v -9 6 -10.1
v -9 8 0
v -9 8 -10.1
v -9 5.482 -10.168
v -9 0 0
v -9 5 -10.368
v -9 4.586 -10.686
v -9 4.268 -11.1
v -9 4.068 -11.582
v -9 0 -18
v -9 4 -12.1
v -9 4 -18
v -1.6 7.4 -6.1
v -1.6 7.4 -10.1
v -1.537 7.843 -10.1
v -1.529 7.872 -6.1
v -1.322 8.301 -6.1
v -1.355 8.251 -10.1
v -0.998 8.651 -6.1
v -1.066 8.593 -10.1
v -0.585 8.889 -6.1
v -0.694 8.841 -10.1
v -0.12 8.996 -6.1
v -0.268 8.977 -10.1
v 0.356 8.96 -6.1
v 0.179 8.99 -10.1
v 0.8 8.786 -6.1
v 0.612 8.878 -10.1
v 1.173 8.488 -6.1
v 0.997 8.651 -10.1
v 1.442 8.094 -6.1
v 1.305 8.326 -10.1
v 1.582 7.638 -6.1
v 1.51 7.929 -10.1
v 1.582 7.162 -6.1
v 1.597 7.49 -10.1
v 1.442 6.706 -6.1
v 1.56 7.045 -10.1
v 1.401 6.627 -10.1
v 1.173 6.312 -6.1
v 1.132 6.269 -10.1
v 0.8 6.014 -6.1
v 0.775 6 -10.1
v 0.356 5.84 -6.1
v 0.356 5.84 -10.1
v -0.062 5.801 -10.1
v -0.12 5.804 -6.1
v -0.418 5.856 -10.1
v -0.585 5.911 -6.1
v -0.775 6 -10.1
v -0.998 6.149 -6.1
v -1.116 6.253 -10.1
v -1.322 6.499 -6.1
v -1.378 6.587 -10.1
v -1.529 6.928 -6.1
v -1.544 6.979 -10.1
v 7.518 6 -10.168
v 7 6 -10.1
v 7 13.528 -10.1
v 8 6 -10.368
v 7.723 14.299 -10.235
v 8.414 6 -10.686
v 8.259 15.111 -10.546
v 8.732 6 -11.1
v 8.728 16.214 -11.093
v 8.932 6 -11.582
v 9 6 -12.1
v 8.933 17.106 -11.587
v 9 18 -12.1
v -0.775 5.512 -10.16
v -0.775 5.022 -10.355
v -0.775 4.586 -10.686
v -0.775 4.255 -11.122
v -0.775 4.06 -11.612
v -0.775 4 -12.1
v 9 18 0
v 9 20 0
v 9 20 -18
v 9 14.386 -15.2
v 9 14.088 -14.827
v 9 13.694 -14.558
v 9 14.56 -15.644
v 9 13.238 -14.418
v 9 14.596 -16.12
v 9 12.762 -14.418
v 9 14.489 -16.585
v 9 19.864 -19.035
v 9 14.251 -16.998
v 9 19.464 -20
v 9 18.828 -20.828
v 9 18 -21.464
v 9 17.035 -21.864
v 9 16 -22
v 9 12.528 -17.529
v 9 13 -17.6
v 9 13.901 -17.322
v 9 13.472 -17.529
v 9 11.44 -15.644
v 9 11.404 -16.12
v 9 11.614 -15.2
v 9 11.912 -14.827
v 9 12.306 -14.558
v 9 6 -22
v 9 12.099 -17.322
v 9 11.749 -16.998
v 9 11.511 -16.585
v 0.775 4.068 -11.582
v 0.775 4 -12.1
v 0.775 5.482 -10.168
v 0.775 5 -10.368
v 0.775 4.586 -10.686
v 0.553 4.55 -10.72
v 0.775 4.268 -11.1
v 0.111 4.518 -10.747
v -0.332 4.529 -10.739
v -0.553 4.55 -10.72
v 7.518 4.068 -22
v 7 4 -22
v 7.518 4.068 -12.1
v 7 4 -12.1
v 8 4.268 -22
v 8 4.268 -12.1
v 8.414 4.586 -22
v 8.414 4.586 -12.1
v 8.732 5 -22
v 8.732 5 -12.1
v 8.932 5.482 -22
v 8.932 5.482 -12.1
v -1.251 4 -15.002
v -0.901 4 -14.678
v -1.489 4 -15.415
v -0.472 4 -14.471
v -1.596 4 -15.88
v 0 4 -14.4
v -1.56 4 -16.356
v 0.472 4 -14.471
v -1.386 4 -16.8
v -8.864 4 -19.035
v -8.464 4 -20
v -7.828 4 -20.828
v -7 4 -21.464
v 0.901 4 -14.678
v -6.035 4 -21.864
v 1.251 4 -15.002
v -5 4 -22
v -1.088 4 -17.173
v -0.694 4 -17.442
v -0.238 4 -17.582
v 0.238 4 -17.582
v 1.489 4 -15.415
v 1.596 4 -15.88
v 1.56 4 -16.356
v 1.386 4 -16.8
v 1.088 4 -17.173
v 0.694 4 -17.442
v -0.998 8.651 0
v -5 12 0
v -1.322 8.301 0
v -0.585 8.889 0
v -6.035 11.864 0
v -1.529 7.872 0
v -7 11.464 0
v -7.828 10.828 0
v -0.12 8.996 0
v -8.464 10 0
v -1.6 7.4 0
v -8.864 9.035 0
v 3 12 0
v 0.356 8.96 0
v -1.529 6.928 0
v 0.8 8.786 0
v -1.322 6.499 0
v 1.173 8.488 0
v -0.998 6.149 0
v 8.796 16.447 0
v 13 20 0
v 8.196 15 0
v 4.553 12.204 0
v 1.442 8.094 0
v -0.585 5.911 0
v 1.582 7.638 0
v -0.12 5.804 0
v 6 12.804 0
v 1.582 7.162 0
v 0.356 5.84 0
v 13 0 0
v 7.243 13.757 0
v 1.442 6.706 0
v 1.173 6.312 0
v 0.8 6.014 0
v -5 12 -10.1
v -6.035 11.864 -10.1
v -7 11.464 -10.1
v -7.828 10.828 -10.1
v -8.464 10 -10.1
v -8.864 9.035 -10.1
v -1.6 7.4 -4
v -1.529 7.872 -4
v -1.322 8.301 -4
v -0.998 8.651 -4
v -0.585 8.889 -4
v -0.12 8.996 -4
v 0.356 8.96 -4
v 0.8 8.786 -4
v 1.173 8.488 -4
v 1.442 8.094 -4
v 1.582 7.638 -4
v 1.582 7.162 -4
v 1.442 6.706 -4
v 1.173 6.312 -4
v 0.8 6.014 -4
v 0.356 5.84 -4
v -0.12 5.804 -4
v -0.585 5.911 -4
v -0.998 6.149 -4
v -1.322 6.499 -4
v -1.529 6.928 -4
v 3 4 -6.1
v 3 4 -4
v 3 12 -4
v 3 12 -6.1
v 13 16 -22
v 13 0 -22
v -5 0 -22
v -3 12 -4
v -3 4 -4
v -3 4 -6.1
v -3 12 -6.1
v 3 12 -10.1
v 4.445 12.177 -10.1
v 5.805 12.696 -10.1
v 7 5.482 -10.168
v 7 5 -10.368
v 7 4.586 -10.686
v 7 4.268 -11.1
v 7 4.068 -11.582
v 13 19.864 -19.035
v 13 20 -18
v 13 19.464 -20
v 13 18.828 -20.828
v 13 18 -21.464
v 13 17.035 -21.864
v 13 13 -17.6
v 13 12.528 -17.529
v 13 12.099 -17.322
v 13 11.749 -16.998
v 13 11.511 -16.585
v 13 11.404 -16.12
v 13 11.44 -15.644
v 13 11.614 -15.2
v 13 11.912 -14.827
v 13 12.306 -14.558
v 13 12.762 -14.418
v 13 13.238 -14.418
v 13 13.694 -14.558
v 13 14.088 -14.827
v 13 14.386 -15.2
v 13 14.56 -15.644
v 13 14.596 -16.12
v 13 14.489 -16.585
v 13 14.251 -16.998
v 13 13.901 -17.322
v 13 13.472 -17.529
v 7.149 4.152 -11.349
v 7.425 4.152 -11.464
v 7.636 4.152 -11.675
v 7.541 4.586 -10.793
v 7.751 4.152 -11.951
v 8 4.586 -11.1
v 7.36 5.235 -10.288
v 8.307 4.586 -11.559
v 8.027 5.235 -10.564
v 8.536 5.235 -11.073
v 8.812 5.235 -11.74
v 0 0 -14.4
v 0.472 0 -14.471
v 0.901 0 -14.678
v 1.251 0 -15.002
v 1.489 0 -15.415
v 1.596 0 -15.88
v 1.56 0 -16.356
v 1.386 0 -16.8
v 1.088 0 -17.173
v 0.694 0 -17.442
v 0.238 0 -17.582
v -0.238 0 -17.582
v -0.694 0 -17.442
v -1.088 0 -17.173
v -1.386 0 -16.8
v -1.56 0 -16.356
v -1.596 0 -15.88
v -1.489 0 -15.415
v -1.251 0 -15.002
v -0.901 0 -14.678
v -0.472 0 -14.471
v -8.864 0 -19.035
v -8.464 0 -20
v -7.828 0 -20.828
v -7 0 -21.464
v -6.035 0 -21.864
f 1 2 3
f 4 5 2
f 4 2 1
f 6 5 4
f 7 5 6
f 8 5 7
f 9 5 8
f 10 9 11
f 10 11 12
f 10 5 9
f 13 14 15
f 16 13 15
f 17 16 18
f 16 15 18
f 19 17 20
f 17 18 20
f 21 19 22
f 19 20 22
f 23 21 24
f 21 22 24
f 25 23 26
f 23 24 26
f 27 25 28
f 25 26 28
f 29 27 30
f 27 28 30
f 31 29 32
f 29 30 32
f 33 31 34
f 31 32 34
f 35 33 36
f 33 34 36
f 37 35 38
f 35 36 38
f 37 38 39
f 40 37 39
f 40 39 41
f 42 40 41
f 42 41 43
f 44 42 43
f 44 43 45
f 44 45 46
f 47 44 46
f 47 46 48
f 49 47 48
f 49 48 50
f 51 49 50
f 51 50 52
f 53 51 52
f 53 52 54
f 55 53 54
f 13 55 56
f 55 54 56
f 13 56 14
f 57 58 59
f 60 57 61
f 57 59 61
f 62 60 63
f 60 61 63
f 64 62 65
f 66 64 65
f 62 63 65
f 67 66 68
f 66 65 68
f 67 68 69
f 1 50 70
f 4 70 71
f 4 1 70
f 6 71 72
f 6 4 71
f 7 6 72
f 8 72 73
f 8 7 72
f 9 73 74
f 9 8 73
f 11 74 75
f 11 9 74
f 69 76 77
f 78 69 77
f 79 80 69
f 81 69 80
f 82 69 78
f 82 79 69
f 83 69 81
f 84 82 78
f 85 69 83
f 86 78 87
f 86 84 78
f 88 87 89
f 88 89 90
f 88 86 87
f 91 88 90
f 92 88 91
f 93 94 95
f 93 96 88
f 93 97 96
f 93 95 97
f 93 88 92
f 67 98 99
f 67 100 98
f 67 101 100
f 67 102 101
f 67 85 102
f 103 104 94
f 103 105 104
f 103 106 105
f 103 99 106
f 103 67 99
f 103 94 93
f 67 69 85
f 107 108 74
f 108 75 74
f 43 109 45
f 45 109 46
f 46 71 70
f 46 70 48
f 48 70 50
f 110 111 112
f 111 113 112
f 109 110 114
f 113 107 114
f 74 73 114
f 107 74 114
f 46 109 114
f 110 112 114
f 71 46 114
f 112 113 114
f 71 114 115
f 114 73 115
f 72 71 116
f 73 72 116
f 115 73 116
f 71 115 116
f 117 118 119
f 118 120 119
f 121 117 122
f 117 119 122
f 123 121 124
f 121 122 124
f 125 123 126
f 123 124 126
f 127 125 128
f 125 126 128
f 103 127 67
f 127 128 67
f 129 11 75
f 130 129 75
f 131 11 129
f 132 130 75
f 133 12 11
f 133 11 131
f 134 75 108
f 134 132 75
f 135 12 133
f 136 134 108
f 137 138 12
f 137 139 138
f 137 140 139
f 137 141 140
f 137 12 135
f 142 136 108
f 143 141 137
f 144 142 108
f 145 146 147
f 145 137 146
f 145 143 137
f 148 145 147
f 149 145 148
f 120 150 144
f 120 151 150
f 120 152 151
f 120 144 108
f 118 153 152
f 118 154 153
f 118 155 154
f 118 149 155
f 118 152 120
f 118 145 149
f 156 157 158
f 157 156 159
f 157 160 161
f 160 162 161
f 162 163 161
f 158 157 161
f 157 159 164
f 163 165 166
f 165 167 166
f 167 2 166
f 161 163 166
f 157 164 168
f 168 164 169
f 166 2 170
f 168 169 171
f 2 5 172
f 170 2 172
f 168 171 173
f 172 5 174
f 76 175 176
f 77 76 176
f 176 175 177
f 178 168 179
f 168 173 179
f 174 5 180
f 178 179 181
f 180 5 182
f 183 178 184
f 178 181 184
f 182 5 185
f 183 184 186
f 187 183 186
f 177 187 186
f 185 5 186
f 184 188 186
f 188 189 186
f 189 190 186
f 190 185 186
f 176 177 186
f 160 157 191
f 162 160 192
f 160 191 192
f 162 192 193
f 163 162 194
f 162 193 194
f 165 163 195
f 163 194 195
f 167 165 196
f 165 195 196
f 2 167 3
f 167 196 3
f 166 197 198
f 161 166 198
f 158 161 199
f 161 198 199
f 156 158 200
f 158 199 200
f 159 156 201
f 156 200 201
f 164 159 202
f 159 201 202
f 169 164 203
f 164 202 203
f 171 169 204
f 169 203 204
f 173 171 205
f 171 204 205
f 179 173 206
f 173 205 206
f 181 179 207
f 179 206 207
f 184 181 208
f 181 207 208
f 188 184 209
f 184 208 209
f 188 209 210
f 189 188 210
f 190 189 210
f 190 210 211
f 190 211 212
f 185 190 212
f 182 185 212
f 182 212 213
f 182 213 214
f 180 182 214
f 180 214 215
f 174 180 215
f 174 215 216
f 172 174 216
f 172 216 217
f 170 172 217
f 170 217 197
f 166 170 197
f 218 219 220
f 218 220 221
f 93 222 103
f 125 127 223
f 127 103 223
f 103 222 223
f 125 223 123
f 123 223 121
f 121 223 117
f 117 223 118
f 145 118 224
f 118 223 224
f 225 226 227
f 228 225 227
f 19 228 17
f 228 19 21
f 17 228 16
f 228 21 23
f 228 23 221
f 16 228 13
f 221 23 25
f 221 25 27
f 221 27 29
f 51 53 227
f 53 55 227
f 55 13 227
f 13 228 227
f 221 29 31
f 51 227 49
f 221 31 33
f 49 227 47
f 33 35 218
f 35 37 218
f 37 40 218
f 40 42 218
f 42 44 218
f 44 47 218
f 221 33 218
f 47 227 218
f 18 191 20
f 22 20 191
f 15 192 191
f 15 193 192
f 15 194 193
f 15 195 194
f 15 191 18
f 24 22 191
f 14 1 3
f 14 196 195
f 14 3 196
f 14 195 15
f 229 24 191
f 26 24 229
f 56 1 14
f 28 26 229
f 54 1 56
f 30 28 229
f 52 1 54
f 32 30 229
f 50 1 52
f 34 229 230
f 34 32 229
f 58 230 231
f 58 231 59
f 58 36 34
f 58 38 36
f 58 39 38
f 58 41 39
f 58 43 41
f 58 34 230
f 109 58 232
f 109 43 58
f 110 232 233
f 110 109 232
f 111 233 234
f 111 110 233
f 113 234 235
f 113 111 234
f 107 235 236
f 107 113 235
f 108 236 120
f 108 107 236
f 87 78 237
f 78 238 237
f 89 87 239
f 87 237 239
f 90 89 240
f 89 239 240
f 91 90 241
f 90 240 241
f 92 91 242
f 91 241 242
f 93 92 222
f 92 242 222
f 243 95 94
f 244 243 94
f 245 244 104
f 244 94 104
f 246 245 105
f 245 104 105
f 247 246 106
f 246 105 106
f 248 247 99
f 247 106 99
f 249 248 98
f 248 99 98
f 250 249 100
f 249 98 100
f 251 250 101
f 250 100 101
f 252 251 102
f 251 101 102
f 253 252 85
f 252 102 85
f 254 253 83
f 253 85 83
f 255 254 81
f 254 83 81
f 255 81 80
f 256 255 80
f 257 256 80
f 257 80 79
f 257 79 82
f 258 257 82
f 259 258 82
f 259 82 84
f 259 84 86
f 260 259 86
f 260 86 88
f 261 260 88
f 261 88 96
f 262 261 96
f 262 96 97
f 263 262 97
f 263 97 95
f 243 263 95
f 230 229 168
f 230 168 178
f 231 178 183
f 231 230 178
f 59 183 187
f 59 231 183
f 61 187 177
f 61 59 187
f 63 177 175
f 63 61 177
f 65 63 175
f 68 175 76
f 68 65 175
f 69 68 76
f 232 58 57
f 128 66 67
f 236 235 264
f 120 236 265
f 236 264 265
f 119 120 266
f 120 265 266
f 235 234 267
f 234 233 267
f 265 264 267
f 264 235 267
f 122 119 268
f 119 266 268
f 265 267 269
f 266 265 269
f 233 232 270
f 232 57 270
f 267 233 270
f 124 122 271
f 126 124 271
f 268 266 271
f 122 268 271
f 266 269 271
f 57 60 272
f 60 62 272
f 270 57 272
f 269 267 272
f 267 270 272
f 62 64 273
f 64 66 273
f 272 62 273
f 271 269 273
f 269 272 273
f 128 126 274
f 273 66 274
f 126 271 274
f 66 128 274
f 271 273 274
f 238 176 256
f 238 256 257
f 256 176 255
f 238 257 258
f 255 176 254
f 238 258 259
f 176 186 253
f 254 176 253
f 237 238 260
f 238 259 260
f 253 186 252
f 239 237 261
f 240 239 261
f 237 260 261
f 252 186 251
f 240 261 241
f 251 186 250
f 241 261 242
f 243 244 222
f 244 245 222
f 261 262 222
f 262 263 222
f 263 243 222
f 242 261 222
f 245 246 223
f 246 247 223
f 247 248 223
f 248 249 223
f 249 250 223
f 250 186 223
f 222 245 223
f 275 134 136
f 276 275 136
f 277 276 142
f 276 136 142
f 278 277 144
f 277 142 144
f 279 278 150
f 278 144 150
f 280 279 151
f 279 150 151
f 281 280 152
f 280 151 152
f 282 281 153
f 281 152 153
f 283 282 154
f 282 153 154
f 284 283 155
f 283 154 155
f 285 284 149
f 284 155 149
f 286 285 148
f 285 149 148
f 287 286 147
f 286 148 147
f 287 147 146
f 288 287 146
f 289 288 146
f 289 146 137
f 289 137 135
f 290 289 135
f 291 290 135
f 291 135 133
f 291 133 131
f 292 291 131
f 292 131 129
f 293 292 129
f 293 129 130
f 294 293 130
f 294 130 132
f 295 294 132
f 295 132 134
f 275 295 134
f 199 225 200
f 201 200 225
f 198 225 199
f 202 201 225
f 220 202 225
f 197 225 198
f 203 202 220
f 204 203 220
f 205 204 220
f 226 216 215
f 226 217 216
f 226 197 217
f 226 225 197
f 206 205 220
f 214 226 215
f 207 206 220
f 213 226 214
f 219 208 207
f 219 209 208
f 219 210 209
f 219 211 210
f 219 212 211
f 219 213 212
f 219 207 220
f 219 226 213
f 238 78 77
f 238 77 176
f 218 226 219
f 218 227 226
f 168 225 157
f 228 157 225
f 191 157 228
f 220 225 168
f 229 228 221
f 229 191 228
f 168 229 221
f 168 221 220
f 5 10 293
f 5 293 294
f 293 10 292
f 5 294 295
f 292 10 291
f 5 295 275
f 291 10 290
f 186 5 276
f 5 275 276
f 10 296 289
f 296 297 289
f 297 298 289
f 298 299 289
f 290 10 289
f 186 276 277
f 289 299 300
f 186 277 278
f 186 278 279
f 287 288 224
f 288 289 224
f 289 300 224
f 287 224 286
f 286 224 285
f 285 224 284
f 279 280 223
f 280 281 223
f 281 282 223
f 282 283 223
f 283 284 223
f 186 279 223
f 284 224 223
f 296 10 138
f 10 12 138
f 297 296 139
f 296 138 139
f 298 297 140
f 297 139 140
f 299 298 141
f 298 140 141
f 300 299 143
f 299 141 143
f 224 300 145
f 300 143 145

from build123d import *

# Parameters (mm, degrees)
SKETCH2_W                         = 18
SKETCH2_H                         = 22
SKETCH2_W_2                       = 4
BOSS_EXTRUDE1_DEPTH               = 4
SKETCH2_4_W                       = 18
SKETCH2_4_H                       = 10.1
SKETCH2_4_W_2                     = 6
SKETCH2_4_H_2                     = 2.1
BOSS_EXTRUDE2_DEPTH               = 12
SKETCH2_5_W                       = 4
SKETCH2_5_H                       = 22
BOSS_EXTRUDE3_DEPTH               = 20
F_3_2_3_2_MOUNT_HOLES_D           = 3.2
F_3_2_3_2_MOUNT_HOLES_ON_FACE_2_D = 3.2
F_3_2_3_2_MOUNT_HOLES_ON_FACE_3_D = 3.2
FILLET2_R                         = 6
FILLET1_R                         = 2
FILLET3_R                         = 4


with BuildPart() as part:
    # Sketch2 → Boss-Extrude1 (new body)
    with BuildSketch(Plane(origin=(0, 0, 0), x_dir=(1, 0, 0), z_dir=(0, 1, 0))):
        with Locations((0, 11)):
            Rectangle(SKETCH2_W, SKETCH2_H)
        with Locations((11, 11)):
            Rectangle(SKETCH2_W_2, SKETCH2_H)
    extrude(amount=BOSS_EXTRUDE1_DEPTH)

    # Sketch2<4> → Boss-Extrude2 (add)
    with BuildSketch(Plane(origin=(0, 0, 0), x_dir=(1, 0, 0), z_dir=(0, 1, 0))):
        with Locations((0, 5.05)):
            Rectangle(SKETCH2_4_W, SKETCH2_4_H)
        with Locations((0, 5.05)):
            Rectangle(SKETCH2_4_W_2, SKETCH2_4_H_2, mode=Mode.SUBTRACT)
    extrude(amount=BOSS_EXTRUDE2_DEPTH)

    # Sketch2<5> → Boss-Extrude3 (add)
    with BuildSketch(Plane(origin=(0, 0, 0), x_dir=(1, 0, 0), z_dir=(0, 1, 0))):
        with Locations((11, 11)):
            Rectangle(SKETCH2_5_W, SKETCH2_5_H)
    extrude(amount=BOSS_EXTRUDE3_DEPTH)

    # Ø3.2 (3.2) Mount Holes (through all)
    with Locations(Plane(origin=(0, 7.4, 0), x_dir=(1, 0, 0), z_dir=(0, 0, 1))):
        with Locations((0, 0)):
            Hole(F_3_2_3_2_MOUNT_HOLES_D / 2)

    # Ø3.2 (3.2) Mount Holes on face 2 (through all)
    with Locations(Plane(origin=(0, 0, -16), x_dir=(0, 0, -1), z_dir=(0, -1, 0))):
        with Locations((0, 0)):
            Hole(F_3_2_3_2_MOUNT_HOLES_ON_FACE_2_D / 2)

    # Ø3.2 (3.2) Mount Holes on face 3 (through all)
    with Locations(Plane(origin=(13, 13, -16), x_dir=(0, 0, 1), z_dir=(1, 0, 0))):
        with Locations((0, 0)):
            Hole(F_3_2_3_2_MOUNT_HOLES_ON_FACE_3_D / 2)

    # Fillet2
    fillet2_edges = [part.edges().sort_by_distance(p)[0] for p in [
        (9, 12, -5.05),
    ]]
    fillet(fillet2_edges, radius=FILLET2_R - 0.0001)  # a hair under: the kernel refuses the full size

    # Fillet1
    fillet1_edges = [part.edges().sort_by_distance(p)[0] for p in [
        (9, 10.99995, -10.1),
        (0, 4, -10.1),
        (9, 4, -16.05),
    ]]
    fillet(fillet1_edges, radius=FILLET1_R)

    # Fillet3
    fillet3_edges = [part.edges().sort_by_distance(p)[0] for p in [
        (-9, 12, -5.05),
        (11, 20, -22),
        (-9, 2, -22),
    ]]
    fillet(fillet3_edges, radius=FILLET3_R)


solid = part.part
